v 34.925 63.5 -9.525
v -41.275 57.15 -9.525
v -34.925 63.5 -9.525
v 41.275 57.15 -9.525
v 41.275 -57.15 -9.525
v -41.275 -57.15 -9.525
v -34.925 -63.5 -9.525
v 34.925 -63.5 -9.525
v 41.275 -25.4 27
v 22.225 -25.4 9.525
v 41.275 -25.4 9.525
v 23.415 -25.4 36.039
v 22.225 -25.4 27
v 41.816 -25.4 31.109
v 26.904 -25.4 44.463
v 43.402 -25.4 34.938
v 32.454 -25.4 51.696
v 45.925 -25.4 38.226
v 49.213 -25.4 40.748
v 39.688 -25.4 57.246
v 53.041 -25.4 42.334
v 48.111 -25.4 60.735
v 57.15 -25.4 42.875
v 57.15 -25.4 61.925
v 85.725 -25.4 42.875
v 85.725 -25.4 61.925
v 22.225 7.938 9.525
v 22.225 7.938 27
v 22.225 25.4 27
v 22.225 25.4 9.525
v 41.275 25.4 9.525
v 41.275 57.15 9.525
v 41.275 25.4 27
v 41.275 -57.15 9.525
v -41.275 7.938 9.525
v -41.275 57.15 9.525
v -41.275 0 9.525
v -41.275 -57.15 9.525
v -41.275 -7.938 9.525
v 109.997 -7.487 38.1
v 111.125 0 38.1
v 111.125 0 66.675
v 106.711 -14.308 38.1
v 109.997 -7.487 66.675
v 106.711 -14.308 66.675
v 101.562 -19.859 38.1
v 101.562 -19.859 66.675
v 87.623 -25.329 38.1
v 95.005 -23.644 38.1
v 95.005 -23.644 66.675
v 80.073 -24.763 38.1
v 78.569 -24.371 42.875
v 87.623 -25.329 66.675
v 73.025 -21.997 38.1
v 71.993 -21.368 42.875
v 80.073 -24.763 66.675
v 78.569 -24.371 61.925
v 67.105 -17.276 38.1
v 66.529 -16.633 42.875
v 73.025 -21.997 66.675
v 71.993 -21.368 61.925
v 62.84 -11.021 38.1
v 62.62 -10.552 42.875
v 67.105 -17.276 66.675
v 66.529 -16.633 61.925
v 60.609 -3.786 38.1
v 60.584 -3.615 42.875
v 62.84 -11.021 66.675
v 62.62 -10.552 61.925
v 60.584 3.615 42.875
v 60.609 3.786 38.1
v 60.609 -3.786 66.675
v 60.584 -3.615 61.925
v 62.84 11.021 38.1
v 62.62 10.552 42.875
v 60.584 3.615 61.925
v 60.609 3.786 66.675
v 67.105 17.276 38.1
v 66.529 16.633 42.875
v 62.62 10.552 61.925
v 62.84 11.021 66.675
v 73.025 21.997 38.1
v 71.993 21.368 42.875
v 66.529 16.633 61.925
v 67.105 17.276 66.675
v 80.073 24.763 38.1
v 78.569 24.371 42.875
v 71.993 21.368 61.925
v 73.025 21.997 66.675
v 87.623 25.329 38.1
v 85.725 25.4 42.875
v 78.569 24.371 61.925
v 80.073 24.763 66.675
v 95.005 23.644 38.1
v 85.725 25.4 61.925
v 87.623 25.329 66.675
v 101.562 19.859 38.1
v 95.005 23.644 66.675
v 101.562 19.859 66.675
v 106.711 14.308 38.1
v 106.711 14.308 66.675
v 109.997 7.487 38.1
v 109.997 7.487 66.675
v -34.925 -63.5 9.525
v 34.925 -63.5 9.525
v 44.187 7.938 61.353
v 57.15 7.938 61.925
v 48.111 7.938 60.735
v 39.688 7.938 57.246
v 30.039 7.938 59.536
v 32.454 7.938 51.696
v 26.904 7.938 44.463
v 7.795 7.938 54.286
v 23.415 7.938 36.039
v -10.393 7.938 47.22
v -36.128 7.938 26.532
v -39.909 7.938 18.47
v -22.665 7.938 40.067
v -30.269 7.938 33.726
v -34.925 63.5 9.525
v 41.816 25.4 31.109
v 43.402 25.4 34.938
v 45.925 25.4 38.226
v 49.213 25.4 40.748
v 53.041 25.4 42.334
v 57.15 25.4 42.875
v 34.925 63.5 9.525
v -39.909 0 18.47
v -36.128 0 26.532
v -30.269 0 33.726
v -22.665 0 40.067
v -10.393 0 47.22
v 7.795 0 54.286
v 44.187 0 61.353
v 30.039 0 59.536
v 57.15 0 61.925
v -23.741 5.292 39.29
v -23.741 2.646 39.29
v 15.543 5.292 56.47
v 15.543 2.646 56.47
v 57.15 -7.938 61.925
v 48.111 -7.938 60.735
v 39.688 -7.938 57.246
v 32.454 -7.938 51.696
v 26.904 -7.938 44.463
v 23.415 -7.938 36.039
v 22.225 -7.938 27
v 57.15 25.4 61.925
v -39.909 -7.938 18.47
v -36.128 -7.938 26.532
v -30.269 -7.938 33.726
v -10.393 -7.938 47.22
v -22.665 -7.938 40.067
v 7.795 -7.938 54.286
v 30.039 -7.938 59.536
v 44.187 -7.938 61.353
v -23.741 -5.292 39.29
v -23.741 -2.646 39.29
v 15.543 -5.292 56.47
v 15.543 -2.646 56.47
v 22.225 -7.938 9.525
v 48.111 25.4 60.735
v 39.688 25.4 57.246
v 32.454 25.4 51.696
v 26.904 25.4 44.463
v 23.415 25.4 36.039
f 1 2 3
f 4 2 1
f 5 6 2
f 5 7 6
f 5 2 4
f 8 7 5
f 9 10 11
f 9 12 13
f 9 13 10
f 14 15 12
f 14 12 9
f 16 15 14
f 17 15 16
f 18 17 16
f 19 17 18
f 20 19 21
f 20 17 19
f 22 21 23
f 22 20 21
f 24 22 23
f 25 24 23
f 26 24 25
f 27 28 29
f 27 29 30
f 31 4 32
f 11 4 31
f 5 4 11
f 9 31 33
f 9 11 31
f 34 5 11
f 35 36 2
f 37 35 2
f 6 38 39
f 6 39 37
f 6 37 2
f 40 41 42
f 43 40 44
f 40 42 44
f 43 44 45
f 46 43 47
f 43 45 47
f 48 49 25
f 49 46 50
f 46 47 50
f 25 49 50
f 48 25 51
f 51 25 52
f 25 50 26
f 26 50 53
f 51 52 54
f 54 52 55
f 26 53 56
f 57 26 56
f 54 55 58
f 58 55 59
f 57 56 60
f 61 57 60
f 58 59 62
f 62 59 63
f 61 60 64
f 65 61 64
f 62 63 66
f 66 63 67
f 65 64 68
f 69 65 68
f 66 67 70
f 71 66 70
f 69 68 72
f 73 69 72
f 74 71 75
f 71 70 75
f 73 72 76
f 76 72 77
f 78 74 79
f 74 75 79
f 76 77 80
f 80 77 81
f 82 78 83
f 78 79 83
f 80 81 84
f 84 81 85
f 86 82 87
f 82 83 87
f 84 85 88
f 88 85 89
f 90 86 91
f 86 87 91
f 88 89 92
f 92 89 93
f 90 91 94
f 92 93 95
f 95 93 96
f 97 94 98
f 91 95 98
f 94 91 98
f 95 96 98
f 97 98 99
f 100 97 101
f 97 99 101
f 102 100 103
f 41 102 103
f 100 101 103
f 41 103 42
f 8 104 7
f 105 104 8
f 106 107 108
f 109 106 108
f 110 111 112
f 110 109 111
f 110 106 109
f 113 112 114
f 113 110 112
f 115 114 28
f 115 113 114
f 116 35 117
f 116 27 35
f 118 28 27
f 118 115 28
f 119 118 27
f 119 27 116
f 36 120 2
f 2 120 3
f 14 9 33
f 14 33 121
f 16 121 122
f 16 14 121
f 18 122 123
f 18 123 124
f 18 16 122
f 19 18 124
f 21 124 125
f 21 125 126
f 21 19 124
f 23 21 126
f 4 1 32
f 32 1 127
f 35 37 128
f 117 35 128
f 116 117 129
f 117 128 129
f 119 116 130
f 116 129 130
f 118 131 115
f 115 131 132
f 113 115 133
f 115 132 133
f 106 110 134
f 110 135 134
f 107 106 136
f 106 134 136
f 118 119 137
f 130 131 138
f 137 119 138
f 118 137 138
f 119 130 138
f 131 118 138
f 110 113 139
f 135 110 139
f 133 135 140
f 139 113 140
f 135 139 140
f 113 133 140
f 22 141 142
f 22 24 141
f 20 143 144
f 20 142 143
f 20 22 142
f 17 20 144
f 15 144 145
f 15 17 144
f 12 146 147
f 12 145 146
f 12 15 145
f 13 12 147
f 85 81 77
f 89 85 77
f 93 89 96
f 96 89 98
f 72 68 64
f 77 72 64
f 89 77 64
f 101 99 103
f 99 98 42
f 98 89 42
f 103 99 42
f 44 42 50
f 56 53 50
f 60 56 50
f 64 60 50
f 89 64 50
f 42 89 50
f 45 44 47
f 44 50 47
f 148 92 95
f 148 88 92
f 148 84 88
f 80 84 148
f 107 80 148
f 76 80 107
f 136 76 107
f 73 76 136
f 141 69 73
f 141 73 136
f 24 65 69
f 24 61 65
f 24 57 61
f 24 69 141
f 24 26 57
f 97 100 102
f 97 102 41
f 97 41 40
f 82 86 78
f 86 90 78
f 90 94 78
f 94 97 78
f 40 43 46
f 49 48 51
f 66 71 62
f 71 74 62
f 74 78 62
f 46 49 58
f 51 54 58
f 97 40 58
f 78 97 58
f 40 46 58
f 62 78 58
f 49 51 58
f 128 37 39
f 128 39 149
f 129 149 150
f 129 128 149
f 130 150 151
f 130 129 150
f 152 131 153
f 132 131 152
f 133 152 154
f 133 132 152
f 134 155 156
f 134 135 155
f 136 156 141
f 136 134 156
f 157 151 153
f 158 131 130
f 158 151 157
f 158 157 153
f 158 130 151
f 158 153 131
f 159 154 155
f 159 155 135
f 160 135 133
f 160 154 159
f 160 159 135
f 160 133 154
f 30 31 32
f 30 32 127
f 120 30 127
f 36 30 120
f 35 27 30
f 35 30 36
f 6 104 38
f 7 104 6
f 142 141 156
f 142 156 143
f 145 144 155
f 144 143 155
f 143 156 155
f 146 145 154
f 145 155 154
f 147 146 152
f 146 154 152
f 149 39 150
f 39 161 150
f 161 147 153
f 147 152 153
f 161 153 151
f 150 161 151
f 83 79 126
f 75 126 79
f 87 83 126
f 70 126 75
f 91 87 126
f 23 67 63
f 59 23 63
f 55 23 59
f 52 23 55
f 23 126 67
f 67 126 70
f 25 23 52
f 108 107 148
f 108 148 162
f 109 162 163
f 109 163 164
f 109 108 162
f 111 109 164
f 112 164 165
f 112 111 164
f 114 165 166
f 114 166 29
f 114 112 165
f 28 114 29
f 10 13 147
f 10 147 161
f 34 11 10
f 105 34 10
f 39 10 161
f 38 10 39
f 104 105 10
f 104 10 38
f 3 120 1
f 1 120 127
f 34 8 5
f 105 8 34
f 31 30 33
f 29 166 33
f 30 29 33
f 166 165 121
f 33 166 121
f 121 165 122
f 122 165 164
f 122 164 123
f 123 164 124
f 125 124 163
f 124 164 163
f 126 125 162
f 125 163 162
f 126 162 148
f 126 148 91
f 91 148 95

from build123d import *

# Parameters (mm, degrees)
F1_DEPTH = 63.5
F0_W     = 25.4
F0_H     = 19.05
F2_DEPTH = 25.4
F3_DEPTH = 7.9375
F5_SIZE  = 6.35


# Not quite as in the source:
# - a feature names something its author has since deleted; it is built from what else it names


with BuildPart() as f1:
    # F0 (on Front) → F1 (new body, symmetric)
    with BuildSketch(Plane.XZ):
        Polygon((-41.275, 9.525), (-41.275, -9.525), (41.275, -9.525), (41.275, 9.525), (22.225, 9.525), align=None)
    extrude(amount=F1_DEPTH, both=True)

    # F0 (on Front) → F2 (join, symmetric)
    with BuildSketch(Plane.XZ):
        with BuildLine():
            Line((22.225, 9.525), (41.275, 9.525))
            Line((41.275, 9.525), (41.275, 27.0002))
            ThreePointArc((41.275, 27.0002), (45.9246798487, 38.2255201513), (57.15, 42.8752))
            Line((57.15, 42.8752), (60.325, 42.8752))
            Line((60.325, 42.8752), (60.325, 61.9252))
            Line((60.325, 61.9252), (57.15, 61.9252))
            ThreePointArc((57.15, 61.9252), (32.4542956671, 51.6959043329), (22.225, 27.0002))
            Line((22.225, 27.0002), (22.225, 9.525))
        make_face()
        with Locations((73.025, 52.4002)):
            Rectangle(F0_W, F0_H)
    extrude(amount=F2_DEPTH, both=True)

    # F0 (on Front) → F3 (join, symmetric)
    with BuildSketch(Plane.XZ):
        with BuildLine():
            add(Edge.make_bspline(
                [(-41.275, 9.525), (-41.0928055644, 45.868396759), (20.8572410047, 62.0456375182), (57.15, 61.9252)],
                knots=[0, 0, 0, 0, 111.5045361635, 111.5045361635, 111.5045361635, 111.5045361635], degree=3))
            Line((-41.275, 9.525), (22.225, 9.525))
            Line((22.225, 9.525), (22.225, 27.0002))
            ThreePointArc((22.225, 27.0002), (32.4542956671, 51.6959043329), (57.15, 61.9252))
        make_face()
    extrude(amount=F3_DEPTH, both=True)

    # F0 (on Front) → F4 (revolve)
    with BuildSketch(Plane.XZ):
        Polygon((85.725, 66.675), (85.725, 61.9252), (85.725, 42.8752), (85.725, 38.1), (111.125, 38.1), (111.125, 66.675), align=None)
    revolve(axis=Axis((85.725, 0, 52.3875), (0, 0, -1)))

    # F5
    f5_edges = [f1.edges().sort_by_distance(p)[0] for p in [
        (41.275, -63.5, 0),
        (-41.275, -63.5, 0),
        (41.275, 63.5, 0),
        (-41.275, 63.5, 0),
    ]]
    chamfer(f5_edges, length=F5_SIZE)


solid = f1.part
